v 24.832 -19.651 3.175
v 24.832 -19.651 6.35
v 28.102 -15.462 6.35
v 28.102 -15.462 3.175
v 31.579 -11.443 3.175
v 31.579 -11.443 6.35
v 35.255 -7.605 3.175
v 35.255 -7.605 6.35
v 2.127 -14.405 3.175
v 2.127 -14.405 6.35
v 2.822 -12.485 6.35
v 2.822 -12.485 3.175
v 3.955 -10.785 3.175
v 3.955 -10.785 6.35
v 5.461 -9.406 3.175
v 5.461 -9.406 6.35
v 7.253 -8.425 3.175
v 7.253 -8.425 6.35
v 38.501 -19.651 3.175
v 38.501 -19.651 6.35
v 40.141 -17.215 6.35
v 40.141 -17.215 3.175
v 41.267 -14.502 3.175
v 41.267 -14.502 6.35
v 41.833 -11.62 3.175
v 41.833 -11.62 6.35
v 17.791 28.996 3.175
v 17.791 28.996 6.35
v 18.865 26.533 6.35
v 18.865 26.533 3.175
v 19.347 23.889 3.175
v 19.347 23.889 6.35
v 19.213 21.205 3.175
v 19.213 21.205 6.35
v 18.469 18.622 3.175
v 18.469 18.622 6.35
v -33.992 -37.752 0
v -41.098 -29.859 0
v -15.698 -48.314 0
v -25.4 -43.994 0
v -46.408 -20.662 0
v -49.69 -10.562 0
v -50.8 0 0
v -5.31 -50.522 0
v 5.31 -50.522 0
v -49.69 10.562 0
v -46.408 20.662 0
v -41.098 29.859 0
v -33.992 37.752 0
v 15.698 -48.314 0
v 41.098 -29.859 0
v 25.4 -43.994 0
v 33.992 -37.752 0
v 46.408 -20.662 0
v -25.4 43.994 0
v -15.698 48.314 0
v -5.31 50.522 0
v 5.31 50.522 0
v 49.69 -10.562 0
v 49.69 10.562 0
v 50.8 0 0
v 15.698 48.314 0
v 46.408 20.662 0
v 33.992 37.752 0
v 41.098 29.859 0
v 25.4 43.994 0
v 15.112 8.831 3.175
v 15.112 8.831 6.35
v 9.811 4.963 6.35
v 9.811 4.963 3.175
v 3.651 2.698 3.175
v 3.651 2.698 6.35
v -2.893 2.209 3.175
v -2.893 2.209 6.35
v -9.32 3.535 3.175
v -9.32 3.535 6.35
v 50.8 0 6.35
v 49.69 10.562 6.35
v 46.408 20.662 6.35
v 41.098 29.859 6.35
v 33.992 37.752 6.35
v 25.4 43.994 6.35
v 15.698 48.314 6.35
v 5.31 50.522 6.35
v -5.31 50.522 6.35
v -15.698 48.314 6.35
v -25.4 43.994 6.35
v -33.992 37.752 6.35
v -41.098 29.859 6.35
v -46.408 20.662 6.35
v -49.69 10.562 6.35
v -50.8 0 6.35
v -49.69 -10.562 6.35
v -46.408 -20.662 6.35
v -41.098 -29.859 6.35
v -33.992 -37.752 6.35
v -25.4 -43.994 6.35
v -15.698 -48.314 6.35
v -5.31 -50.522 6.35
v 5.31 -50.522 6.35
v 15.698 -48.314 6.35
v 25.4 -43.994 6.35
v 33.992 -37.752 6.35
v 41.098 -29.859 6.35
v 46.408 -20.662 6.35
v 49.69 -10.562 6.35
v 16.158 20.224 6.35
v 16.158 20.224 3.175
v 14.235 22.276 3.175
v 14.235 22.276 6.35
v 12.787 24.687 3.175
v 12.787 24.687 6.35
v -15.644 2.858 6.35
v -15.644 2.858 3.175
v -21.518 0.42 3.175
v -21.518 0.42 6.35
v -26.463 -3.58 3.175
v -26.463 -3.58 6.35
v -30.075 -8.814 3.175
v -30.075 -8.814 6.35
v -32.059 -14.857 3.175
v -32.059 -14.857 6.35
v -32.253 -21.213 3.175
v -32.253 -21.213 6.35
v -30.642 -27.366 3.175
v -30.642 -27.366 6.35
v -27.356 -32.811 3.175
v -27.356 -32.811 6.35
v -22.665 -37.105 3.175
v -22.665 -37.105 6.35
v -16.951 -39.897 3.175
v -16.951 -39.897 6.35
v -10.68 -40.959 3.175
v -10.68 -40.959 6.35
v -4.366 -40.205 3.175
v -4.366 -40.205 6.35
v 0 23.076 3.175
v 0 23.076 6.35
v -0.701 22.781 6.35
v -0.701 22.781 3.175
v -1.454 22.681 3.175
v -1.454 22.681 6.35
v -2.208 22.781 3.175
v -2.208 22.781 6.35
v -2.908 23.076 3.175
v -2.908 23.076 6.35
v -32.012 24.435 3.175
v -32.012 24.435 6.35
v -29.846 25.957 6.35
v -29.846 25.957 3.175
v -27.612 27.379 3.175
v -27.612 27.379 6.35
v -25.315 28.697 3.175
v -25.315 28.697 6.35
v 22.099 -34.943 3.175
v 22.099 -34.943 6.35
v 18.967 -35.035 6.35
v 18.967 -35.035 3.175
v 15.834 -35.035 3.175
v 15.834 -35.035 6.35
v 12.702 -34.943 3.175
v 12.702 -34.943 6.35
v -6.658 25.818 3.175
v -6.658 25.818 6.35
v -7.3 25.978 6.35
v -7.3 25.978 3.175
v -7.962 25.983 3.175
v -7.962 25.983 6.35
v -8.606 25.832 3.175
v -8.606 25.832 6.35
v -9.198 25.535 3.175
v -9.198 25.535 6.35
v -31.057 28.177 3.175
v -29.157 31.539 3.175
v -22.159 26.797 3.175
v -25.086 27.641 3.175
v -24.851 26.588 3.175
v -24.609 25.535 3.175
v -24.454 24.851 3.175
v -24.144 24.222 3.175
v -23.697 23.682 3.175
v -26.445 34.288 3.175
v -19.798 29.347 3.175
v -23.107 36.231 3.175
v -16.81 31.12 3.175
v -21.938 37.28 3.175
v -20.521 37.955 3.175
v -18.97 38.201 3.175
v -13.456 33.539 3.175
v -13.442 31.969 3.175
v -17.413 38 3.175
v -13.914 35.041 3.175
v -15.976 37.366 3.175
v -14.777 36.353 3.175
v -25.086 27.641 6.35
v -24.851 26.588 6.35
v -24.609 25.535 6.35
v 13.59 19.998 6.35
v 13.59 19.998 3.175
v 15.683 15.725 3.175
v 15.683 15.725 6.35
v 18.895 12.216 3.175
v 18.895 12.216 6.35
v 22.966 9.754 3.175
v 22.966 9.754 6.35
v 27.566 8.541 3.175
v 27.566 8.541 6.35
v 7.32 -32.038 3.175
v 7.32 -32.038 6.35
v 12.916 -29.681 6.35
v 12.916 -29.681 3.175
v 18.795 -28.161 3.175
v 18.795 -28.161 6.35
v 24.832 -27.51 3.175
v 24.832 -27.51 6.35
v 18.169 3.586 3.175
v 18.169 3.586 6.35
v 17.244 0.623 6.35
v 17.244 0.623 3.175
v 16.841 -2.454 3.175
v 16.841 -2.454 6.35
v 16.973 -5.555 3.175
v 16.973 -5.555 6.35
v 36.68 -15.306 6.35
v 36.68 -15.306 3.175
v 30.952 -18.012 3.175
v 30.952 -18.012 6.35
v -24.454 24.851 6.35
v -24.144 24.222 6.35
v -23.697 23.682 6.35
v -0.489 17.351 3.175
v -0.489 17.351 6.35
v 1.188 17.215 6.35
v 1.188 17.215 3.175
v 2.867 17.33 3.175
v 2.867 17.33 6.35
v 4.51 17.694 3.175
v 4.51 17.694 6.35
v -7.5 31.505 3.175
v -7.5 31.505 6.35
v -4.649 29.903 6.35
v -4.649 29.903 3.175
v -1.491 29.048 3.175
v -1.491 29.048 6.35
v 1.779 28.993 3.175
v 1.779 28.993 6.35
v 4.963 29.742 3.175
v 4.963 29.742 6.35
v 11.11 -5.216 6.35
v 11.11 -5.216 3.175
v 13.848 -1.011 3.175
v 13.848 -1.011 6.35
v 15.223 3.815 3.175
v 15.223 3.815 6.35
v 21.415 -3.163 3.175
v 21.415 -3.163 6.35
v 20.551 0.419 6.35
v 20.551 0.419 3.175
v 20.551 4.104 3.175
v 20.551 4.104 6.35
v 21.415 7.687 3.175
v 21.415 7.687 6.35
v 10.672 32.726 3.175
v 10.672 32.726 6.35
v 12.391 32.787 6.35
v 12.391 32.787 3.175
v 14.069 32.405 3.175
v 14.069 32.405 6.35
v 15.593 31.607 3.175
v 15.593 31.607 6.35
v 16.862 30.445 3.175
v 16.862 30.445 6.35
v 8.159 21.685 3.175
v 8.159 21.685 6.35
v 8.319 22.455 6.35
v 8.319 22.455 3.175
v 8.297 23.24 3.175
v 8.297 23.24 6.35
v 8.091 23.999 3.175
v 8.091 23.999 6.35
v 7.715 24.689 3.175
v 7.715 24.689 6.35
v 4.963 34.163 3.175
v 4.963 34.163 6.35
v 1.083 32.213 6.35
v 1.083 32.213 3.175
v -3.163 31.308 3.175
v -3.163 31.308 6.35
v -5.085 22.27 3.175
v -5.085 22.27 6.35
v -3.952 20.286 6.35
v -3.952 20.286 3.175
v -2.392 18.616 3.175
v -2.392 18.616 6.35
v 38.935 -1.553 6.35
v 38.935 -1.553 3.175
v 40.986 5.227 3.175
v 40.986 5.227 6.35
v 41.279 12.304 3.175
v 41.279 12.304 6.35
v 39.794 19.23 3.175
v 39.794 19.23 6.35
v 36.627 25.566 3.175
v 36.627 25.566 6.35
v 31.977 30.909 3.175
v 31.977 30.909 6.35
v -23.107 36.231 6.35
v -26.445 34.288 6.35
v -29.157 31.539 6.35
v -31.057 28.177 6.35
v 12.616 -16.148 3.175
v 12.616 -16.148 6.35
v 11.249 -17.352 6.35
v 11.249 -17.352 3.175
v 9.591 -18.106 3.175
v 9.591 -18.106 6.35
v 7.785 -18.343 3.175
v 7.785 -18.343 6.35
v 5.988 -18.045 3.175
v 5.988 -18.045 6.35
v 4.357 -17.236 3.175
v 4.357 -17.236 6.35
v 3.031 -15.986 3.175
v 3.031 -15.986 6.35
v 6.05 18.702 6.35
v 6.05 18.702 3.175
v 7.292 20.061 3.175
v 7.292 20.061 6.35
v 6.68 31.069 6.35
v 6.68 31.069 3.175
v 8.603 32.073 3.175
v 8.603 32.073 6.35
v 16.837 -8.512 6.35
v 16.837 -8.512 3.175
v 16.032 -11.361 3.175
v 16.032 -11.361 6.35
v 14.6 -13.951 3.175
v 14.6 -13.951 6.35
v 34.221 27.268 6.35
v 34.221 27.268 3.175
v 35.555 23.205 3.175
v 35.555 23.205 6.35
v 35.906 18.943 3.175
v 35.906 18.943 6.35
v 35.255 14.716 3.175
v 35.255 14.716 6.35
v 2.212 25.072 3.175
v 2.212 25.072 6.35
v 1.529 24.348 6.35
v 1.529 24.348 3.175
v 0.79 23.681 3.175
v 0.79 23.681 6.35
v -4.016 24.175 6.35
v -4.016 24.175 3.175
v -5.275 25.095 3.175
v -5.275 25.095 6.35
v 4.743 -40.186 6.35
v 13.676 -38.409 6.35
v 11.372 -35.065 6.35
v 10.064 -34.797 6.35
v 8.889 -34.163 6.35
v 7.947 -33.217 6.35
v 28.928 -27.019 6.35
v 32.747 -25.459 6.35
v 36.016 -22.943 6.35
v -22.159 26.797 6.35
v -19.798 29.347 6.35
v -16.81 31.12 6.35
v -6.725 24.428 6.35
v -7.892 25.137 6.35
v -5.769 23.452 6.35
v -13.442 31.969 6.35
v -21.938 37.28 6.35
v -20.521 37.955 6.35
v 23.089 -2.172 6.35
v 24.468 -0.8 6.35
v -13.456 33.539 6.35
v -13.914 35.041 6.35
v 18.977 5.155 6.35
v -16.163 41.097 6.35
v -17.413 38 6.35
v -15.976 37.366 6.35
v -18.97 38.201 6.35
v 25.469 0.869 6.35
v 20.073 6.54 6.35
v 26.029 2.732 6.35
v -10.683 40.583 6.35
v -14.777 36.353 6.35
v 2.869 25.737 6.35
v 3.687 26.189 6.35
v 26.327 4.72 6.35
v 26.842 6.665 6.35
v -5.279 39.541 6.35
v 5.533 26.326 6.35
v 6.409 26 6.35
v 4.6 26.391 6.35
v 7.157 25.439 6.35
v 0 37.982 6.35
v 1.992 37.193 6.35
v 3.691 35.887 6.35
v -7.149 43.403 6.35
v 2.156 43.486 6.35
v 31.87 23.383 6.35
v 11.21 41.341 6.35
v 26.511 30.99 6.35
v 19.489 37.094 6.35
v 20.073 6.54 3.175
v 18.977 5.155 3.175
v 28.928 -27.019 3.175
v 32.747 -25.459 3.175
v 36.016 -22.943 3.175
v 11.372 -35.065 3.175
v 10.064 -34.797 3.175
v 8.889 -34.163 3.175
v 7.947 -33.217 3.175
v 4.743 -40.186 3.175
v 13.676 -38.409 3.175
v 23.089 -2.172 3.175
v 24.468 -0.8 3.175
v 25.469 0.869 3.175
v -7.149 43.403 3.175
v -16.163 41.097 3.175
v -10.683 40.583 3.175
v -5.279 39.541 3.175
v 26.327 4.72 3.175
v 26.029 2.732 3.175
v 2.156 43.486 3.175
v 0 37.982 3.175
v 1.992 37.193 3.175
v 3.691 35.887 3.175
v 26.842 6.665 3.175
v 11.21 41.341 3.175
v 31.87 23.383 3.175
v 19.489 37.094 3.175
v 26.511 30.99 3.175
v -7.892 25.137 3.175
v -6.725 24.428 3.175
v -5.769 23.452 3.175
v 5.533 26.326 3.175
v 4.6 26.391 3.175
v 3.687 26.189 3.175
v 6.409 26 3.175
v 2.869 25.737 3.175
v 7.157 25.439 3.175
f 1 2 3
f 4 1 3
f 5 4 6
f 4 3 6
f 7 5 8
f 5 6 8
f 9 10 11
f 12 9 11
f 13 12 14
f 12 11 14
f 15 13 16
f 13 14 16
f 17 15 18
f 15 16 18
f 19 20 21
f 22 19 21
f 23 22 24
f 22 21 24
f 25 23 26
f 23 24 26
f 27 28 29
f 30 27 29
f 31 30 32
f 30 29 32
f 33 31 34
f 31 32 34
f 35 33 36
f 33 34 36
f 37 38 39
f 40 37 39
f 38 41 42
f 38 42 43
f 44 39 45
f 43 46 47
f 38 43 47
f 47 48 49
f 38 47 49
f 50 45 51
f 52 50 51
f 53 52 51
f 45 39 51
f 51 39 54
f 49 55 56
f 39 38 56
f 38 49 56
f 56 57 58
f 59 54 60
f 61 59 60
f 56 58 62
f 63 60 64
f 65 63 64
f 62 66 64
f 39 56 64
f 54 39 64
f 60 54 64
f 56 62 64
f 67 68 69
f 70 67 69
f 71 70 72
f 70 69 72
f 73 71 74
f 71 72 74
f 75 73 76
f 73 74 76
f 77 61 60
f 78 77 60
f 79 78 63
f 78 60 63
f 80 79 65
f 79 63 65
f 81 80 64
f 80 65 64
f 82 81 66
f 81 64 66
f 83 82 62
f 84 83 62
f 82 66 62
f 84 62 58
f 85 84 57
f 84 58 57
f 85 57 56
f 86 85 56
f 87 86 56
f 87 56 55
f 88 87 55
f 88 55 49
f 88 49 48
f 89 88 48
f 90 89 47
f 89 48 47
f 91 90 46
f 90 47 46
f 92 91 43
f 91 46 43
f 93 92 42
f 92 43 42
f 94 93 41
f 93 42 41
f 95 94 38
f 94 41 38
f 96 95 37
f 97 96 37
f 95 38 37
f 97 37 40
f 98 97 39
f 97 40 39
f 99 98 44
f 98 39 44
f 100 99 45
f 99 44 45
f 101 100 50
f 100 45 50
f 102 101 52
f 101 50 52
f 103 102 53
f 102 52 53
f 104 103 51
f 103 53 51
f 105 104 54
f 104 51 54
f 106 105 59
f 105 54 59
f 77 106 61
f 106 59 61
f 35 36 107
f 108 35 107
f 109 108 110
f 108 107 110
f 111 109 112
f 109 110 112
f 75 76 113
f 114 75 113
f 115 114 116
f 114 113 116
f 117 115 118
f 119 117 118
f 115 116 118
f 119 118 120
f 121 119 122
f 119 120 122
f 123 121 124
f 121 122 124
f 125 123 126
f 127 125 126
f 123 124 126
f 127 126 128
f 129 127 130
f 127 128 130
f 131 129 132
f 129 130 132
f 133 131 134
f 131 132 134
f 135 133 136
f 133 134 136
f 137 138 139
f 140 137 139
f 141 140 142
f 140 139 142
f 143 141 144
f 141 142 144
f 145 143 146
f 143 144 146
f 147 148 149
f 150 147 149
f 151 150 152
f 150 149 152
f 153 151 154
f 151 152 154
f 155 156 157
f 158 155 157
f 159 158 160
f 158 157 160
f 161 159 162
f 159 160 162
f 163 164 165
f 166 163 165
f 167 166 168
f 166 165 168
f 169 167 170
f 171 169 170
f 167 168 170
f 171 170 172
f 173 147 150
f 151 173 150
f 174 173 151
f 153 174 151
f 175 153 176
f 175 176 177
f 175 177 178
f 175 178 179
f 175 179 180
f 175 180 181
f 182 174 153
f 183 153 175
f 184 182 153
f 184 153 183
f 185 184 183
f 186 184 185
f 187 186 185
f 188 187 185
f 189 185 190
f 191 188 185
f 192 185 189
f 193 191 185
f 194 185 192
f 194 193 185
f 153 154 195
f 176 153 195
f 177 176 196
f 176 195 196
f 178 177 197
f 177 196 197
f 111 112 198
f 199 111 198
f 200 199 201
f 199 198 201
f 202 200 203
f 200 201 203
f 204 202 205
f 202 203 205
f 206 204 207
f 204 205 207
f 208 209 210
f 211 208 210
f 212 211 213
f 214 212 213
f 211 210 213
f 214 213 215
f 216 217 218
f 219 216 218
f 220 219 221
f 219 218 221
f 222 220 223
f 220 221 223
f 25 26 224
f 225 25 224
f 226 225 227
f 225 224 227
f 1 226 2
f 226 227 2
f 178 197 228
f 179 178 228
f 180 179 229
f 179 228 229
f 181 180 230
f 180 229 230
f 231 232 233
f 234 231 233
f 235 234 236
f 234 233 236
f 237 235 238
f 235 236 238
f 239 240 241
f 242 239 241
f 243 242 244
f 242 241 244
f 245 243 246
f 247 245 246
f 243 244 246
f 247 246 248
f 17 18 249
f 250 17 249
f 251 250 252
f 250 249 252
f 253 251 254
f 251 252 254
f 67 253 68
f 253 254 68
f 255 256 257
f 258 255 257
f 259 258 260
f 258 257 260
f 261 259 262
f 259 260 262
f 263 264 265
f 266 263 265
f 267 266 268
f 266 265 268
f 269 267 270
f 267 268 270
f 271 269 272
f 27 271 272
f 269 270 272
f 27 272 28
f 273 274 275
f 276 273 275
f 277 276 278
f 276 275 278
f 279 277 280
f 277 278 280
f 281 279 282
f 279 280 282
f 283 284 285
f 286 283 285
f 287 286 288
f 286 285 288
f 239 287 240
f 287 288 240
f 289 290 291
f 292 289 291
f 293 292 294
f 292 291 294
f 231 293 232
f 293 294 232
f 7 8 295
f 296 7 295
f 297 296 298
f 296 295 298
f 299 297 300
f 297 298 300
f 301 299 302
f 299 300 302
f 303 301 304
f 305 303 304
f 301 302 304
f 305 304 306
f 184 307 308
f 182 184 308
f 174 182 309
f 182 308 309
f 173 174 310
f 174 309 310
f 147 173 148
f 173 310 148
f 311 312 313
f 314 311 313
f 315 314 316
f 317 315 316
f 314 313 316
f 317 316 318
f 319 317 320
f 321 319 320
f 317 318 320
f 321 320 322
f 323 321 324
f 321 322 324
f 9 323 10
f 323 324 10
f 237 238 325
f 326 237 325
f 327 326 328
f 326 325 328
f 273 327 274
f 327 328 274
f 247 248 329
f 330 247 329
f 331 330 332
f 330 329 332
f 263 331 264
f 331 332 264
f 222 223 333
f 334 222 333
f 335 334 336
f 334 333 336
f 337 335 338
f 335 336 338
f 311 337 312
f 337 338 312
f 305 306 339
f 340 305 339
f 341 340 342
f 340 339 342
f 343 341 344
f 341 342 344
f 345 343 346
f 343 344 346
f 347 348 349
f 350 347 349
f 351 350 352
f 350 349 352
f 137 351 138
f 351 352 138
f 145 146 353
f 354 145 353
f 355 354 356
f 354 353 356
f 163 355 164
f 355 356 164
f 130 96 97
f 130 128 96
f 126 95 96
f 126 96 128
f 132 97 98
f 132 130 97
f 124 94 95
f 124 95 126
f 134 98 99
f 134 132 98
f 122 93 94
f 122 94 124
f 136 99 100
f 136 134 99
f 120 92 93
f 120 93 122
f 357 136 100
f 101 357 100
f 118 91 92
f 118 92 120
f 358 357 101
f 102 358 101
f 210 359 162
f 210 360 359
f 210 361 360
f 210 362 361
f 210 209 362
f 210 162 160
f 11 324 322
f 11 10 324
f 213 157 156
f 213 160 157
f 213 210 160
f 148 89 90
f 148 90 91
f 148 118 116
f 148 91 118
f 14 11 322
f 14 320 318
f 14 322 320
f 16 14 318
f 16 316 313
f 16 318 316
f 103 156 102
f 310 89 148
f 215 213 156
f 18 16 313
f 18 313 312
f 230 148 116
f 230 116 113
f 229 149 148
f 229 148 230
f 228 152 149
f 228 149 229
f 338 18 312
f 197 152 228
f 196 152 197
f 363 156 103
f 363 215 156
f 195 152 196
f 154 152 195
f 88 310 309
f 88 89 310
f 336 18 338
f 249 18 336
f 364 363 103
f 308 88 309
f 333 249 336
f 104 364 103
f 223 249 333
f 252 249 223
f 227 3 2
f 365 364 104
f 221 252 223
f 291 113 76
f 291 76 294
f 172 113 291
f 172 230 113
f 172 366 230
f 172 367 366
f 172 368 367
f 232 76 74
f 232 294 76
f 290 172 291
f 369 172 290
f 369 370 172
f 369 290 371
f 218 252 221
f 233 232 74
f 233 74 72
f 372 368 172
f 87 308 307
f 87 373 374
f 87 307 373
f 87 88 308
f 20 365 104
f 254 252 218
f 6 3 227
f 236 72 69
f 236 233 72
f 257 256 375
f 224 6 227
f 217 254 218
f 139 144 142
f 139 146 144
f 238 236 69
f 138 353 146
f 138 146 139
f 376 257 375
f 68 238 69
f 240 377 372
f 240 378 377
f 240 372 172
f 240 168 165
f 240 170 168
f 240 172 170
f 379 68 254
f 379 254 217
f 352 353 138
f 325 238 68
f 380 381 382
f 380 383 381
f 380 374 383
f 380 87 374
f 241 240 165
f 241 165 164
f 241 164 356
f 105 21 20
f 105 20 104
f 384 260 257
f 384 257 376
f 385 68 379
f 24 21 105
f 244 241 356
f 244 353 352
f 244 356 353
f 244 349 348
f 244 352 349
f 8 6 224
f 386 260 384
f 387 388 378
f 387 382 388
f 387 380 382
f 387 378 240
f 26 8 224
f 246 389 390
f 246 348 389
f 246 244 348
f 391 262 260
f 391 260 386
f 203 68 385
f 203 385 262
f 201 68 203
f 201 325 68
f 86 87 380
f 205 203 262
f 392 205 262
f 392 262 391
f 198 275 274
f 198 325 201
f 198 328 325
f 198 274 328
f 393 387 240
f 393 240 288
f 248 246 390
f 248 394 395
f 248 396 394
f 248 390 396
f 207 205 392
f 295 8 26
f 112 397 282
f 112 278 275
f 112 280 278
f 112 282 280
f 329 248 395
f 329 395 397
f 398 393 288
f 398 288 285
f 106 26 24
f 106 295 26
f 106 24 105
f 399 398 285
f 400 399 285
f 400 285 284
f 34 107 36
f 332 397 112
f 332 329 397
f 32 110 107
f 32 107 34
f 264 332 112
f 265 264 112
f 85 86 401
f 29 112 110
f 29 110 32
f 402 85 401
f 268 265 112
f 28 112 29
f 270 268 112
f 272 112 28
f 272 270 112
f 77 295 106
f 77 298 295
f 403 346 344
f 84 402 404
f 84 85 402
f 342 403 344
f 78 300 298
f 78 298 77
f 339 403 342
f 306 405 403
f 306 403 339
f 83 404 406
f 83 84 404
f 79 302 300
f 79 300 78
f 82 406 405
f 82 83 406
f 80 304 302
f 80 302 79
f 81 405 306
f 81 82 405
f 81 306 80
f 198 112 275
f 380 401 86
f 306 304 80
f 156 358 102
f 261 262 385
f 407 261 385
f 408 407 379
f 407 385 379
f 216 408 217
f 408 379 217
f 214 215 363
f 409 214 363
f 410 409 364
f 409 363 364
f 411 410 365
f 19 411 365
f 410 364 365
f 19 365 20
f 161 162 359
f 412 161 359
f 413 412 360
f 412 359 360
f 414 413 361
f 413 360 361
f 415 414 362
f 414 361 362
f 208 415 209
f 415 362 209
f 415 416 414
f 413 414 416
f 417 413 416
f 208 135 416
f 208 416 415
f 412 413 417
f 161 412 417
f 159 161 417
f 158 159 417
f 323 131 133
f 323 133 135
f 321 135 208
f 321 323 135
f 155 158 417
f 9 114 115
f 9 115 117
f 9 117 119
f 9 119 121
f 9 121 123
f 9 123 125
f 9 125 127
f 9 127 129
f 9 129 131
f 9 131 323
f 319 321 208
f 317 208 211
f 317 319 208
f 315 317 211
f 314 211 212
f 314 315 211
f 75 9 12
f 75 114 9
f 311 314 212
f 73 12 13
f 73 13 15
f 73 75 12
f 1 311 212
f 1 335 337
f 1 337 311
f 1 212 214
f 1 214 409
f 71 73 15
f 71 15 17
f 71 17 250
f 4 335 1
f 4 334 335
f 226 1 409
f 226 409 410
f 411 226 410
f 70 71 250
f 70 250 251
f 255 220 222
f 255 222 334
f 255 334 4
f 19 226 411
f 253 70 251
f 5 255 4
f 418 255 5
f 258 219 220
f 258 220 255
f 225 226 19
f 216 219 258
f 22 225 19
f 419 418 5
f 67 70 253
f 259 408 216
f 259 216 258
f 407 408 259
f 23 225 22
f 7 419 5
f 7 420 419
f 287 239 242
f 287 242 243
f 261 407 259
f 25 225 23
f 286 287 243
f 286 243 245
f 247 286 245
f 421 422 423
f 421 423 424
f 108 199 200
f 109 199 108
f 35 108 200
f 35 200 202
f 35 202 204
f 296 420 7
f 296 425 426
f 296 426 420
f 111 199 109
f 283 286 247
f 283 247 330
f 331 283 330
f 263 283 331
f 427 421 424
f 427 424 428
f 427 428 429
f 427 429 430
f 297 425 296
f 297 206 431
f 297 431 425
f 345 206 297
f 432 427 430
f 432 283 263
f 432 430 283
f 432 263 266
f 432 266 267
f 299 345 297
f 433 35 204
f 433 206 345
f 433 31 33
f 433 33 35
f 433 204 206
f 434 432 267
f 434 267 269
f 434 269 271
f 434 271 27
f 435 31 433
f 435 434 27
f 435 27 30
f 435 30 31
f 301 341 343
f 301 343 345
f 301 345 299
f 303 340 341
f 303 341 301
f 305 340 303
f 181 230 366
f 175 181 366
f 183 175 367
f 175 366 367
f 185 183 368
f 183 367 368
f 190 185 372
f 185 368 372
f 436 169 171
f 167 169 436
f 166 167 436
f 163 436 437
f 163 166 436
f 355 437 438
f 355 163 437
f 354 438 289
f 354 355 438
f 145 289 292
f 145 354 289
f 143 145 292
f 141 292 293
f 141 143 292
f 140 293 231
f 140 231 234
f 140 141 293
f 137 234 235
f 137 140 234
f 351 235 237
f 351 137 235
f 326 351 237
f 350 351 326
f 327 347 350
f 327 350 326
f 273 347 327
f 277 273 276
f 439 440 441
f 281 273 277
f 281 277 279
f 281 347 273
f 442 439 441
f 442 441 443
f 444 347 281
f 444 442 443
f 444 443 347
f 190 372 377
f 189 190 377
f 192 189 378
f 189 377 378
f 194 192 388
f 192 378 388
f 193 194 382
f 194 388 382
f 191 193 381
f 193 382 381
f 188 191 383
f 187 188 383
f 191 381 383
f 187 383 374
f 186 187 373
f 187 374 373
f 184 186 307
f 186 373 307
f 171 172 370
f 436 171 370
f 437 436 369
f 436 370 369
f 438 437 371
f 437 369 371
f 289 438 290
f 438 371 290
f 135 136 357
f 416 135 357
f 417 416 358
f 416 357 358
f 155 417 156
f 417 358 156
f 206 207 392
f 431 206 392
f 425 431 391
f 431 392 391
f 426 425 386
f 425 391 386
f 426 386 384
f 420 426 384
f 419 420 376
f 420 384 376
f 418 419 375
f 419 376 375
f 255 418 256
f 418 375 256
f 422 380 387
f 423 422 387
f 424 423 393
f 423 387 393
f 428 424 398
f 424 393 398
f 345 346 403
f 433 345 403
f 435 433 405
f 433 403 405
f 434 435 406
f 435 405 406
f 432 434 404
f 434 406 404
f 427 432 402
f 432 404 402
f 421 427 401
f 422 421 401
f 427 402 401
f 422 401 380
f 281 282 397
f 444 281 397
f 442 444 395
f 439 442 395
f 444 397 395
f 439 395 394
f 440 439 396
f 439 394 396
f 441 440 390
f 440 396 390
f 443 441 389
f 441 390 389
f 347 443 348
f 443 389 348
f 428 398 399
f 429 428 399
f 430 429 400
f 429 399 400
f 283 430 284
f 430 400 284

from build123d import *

# Parameters (mm, degrees)
F0_R     = 50.8
F1_DEPTH = 6.35
F3_DEPTH = 3.175


with BuildPart() as f1:
    # F0 (on Top) → F1 (new body)
    with BuildSketch(Plane.XY):
        Circle(F0_R)
    extrude(amount=F1_DEPTH)

    # F2 (on face) → F3 (cut)
    with BuildSketch(Plane.XY.offset(6.35)):
        with BuildLine():
            ThreePointArc((15.112324, 8.831488), (3.651467, 2.698075), (-9.320416, 3.53488))
            ThreePointArc((-9.320416, 3.53488), (-32.253054, -21.213472), (-4.365525, -40.204853))
            ThreePointArc((-4.365525, -40.204853), (9.25251, -39.514444), (22.098763, -34.942649))
            ThreePointArc((22.098763, -34.942649), (17.400158, -35.046174), (12.701553, -34.942649))
            ThreePointArc((12.701553, -34.942649), (9.453009, -34.523417), (7.319516, -32.038059))
            ThreePointArc((7.319516, -32.038059), (15.827852, -28.814343), (24.832496, -27.510311))
            ThreePointArc((24.832496, -27.510311), (32.746976, -25.459085), (38.501162, -19.650828))
            ThreePointArc((38.501162, -19.650828), (40.771781, -15.886564), (41.832902, -11.620486))
            ThreePointArc((41.832902, -11.620486), (33.877001, -16.787957), (24.832496, -19.650828))
            ThreePointArc((24.832496, -19.650828), (29.815505, -13.430648), (35.254855, -7.605316))
            ThreePointArc((35.254855, -7.605316), (41.278783, 12.303986), (31.977173, 30.909041))
            ThreePointArc((31.977173, 30.909041), (35.554887, 23.205066), (35.254855, 14.716176))
            ThreePointArc((35.254855, 14.716176), (15.477583, 39.467908), (-16.163122, 41.097168))
            ThreePointArc((-16.163122, 41.097168), (-7.968292, 40.127246), (0, 37.98195))
            ThreePointArc((0, 37.98195), (2.887171, 36.599375), (4.963089, 34.162607))
            ThreePointArc((4.963089, 34.162607), (-1.010732, 31.624663), (-7.500219, 31.505231))
            ThreePointArc((-7.500219, 31.505231), (-1.491468, 29.04792), (4.963089, 29.742295))
            ThreePointArc((4.963089, 29.742295), (7.619099, 31.6133), (10.671567, 32.725722))
            ThreePointArc((10.671567, 32.725722), (14.857029, 32.055581), (17.791109, 28.99644))
            ThreePointArc((17.791109, 28.99644), (19.347167, 23.888888), (18.469164, 18.622248))
            ThreePointArc((18.469164, 18.622248), (15.14181, 21.198982), (12.786984, 24.68691))
            ThreePointArc((12.786984, 24.68691), (17.163098, 13.855457), (27.56623, 8.540798))
            ThreePointArc((27.56623, 8.540798), (26.557747, 5.699635), (26.028505, 2.731615))
            ThreePointArc((26.028505, 2.731615), (24.468311, -0.799827), (21.415329, -3.162999))
            ThreePointArc((21.415329, -3.162999), (20.44222, 2.261754), (21.415329, 7.686506))
            ThreePointArc((21.415329, 7.686506), (19.491688, 5.874092), (18.169021, 3.585906))
            ThreePointArc((18.169021, 3.585906), (16.975731, -0.906667), (16.973011, -5.555016))
            ThreePointArc((16.973011, -5.555016), (16.032075, -11.360599), (12.616124, -16.148232))
            ThreePointArc((12.616124, -16.148232), (6.875784, -18.260537), (2.127092, -14.405247))
            ThreePointArc((2.127092, -14.405247), (3.95514, -10.785374), (7.252841, -8.425204))
            ThreePointArc((7.252841, -8.425204), (13.847913, -1.010771), (15.112324, 8.831488))
        make_face()
        with BuildLine():
            ThreePointArc((-23.696838, 23.682131), (-19.798362, 29.346782), (-13.441595, 31.969357))
            ThreePointArc((-13.441595, 31.969357), (-16.672015, 37.73461), (-23.107406, 36.231447))
            ThreePointArc((-23.107406, 36.231447), (-29.15748, 31.539036), (-32.012127, 24.434594))
            ThreePointArc((-32.012127, 24.434594), (-28.736741, 26.680977), (-25.31456, 28.696684))
            ThreePointArc((-25.31456, 28.696684), (-24.969334, 27.114262), (-24.609111, 25.535187))
            ThreePointArc((-24.609111, 25.535187), (-24.317241, 24.527789), (-23.696838, 23.682131))
        make_face()
        with BuildLine():
            ThreePointArc((-9.197756, 25.535187), (-6.724581, 24.427669), (-5.085402, 22.269826))
            ThreePointArc((-5.085402, 22.269826), (-3.220597, 19.405613), (-0.489241, 17.351128))
            ThreePointArc((-0.489241, 17.351128), (2.029713, 17.241099), (4.510092, 17.693825))
            ThreePointArc((4.510092, 17.693825), (6.713953, 19.342602), (8.158797, 21.685228))
            ThreePointArc((8.158797, 21.685228), (8.296615, 23.240133), (7.715309, 24.688859))
            ThreePointArc((7.715309, 24.688859), (5.068899, 26.392475), (2.212011, 25.071872))
            ThreePointArc((2.212011, 25.071872), (1.166697, 24.006752), (0, 23.076171))
            ThreePointArc((0, 23.076171), (-1.454137, 22.680928), (-2.908273, 23.076171))
            ThreePointArc((-2.908273, 23.076171), (-4.628321, 24.658533), (-6.657773, 25.817741))
            ThreePointArc((-6.657773, 25.817741), (-7.961822, 25.982624), (-9.197756, 25.535187))
        make_face()
    extrude(amount=-F3_DEPTH, mode=Mode.SUBTRACT)


solid = f1.part
